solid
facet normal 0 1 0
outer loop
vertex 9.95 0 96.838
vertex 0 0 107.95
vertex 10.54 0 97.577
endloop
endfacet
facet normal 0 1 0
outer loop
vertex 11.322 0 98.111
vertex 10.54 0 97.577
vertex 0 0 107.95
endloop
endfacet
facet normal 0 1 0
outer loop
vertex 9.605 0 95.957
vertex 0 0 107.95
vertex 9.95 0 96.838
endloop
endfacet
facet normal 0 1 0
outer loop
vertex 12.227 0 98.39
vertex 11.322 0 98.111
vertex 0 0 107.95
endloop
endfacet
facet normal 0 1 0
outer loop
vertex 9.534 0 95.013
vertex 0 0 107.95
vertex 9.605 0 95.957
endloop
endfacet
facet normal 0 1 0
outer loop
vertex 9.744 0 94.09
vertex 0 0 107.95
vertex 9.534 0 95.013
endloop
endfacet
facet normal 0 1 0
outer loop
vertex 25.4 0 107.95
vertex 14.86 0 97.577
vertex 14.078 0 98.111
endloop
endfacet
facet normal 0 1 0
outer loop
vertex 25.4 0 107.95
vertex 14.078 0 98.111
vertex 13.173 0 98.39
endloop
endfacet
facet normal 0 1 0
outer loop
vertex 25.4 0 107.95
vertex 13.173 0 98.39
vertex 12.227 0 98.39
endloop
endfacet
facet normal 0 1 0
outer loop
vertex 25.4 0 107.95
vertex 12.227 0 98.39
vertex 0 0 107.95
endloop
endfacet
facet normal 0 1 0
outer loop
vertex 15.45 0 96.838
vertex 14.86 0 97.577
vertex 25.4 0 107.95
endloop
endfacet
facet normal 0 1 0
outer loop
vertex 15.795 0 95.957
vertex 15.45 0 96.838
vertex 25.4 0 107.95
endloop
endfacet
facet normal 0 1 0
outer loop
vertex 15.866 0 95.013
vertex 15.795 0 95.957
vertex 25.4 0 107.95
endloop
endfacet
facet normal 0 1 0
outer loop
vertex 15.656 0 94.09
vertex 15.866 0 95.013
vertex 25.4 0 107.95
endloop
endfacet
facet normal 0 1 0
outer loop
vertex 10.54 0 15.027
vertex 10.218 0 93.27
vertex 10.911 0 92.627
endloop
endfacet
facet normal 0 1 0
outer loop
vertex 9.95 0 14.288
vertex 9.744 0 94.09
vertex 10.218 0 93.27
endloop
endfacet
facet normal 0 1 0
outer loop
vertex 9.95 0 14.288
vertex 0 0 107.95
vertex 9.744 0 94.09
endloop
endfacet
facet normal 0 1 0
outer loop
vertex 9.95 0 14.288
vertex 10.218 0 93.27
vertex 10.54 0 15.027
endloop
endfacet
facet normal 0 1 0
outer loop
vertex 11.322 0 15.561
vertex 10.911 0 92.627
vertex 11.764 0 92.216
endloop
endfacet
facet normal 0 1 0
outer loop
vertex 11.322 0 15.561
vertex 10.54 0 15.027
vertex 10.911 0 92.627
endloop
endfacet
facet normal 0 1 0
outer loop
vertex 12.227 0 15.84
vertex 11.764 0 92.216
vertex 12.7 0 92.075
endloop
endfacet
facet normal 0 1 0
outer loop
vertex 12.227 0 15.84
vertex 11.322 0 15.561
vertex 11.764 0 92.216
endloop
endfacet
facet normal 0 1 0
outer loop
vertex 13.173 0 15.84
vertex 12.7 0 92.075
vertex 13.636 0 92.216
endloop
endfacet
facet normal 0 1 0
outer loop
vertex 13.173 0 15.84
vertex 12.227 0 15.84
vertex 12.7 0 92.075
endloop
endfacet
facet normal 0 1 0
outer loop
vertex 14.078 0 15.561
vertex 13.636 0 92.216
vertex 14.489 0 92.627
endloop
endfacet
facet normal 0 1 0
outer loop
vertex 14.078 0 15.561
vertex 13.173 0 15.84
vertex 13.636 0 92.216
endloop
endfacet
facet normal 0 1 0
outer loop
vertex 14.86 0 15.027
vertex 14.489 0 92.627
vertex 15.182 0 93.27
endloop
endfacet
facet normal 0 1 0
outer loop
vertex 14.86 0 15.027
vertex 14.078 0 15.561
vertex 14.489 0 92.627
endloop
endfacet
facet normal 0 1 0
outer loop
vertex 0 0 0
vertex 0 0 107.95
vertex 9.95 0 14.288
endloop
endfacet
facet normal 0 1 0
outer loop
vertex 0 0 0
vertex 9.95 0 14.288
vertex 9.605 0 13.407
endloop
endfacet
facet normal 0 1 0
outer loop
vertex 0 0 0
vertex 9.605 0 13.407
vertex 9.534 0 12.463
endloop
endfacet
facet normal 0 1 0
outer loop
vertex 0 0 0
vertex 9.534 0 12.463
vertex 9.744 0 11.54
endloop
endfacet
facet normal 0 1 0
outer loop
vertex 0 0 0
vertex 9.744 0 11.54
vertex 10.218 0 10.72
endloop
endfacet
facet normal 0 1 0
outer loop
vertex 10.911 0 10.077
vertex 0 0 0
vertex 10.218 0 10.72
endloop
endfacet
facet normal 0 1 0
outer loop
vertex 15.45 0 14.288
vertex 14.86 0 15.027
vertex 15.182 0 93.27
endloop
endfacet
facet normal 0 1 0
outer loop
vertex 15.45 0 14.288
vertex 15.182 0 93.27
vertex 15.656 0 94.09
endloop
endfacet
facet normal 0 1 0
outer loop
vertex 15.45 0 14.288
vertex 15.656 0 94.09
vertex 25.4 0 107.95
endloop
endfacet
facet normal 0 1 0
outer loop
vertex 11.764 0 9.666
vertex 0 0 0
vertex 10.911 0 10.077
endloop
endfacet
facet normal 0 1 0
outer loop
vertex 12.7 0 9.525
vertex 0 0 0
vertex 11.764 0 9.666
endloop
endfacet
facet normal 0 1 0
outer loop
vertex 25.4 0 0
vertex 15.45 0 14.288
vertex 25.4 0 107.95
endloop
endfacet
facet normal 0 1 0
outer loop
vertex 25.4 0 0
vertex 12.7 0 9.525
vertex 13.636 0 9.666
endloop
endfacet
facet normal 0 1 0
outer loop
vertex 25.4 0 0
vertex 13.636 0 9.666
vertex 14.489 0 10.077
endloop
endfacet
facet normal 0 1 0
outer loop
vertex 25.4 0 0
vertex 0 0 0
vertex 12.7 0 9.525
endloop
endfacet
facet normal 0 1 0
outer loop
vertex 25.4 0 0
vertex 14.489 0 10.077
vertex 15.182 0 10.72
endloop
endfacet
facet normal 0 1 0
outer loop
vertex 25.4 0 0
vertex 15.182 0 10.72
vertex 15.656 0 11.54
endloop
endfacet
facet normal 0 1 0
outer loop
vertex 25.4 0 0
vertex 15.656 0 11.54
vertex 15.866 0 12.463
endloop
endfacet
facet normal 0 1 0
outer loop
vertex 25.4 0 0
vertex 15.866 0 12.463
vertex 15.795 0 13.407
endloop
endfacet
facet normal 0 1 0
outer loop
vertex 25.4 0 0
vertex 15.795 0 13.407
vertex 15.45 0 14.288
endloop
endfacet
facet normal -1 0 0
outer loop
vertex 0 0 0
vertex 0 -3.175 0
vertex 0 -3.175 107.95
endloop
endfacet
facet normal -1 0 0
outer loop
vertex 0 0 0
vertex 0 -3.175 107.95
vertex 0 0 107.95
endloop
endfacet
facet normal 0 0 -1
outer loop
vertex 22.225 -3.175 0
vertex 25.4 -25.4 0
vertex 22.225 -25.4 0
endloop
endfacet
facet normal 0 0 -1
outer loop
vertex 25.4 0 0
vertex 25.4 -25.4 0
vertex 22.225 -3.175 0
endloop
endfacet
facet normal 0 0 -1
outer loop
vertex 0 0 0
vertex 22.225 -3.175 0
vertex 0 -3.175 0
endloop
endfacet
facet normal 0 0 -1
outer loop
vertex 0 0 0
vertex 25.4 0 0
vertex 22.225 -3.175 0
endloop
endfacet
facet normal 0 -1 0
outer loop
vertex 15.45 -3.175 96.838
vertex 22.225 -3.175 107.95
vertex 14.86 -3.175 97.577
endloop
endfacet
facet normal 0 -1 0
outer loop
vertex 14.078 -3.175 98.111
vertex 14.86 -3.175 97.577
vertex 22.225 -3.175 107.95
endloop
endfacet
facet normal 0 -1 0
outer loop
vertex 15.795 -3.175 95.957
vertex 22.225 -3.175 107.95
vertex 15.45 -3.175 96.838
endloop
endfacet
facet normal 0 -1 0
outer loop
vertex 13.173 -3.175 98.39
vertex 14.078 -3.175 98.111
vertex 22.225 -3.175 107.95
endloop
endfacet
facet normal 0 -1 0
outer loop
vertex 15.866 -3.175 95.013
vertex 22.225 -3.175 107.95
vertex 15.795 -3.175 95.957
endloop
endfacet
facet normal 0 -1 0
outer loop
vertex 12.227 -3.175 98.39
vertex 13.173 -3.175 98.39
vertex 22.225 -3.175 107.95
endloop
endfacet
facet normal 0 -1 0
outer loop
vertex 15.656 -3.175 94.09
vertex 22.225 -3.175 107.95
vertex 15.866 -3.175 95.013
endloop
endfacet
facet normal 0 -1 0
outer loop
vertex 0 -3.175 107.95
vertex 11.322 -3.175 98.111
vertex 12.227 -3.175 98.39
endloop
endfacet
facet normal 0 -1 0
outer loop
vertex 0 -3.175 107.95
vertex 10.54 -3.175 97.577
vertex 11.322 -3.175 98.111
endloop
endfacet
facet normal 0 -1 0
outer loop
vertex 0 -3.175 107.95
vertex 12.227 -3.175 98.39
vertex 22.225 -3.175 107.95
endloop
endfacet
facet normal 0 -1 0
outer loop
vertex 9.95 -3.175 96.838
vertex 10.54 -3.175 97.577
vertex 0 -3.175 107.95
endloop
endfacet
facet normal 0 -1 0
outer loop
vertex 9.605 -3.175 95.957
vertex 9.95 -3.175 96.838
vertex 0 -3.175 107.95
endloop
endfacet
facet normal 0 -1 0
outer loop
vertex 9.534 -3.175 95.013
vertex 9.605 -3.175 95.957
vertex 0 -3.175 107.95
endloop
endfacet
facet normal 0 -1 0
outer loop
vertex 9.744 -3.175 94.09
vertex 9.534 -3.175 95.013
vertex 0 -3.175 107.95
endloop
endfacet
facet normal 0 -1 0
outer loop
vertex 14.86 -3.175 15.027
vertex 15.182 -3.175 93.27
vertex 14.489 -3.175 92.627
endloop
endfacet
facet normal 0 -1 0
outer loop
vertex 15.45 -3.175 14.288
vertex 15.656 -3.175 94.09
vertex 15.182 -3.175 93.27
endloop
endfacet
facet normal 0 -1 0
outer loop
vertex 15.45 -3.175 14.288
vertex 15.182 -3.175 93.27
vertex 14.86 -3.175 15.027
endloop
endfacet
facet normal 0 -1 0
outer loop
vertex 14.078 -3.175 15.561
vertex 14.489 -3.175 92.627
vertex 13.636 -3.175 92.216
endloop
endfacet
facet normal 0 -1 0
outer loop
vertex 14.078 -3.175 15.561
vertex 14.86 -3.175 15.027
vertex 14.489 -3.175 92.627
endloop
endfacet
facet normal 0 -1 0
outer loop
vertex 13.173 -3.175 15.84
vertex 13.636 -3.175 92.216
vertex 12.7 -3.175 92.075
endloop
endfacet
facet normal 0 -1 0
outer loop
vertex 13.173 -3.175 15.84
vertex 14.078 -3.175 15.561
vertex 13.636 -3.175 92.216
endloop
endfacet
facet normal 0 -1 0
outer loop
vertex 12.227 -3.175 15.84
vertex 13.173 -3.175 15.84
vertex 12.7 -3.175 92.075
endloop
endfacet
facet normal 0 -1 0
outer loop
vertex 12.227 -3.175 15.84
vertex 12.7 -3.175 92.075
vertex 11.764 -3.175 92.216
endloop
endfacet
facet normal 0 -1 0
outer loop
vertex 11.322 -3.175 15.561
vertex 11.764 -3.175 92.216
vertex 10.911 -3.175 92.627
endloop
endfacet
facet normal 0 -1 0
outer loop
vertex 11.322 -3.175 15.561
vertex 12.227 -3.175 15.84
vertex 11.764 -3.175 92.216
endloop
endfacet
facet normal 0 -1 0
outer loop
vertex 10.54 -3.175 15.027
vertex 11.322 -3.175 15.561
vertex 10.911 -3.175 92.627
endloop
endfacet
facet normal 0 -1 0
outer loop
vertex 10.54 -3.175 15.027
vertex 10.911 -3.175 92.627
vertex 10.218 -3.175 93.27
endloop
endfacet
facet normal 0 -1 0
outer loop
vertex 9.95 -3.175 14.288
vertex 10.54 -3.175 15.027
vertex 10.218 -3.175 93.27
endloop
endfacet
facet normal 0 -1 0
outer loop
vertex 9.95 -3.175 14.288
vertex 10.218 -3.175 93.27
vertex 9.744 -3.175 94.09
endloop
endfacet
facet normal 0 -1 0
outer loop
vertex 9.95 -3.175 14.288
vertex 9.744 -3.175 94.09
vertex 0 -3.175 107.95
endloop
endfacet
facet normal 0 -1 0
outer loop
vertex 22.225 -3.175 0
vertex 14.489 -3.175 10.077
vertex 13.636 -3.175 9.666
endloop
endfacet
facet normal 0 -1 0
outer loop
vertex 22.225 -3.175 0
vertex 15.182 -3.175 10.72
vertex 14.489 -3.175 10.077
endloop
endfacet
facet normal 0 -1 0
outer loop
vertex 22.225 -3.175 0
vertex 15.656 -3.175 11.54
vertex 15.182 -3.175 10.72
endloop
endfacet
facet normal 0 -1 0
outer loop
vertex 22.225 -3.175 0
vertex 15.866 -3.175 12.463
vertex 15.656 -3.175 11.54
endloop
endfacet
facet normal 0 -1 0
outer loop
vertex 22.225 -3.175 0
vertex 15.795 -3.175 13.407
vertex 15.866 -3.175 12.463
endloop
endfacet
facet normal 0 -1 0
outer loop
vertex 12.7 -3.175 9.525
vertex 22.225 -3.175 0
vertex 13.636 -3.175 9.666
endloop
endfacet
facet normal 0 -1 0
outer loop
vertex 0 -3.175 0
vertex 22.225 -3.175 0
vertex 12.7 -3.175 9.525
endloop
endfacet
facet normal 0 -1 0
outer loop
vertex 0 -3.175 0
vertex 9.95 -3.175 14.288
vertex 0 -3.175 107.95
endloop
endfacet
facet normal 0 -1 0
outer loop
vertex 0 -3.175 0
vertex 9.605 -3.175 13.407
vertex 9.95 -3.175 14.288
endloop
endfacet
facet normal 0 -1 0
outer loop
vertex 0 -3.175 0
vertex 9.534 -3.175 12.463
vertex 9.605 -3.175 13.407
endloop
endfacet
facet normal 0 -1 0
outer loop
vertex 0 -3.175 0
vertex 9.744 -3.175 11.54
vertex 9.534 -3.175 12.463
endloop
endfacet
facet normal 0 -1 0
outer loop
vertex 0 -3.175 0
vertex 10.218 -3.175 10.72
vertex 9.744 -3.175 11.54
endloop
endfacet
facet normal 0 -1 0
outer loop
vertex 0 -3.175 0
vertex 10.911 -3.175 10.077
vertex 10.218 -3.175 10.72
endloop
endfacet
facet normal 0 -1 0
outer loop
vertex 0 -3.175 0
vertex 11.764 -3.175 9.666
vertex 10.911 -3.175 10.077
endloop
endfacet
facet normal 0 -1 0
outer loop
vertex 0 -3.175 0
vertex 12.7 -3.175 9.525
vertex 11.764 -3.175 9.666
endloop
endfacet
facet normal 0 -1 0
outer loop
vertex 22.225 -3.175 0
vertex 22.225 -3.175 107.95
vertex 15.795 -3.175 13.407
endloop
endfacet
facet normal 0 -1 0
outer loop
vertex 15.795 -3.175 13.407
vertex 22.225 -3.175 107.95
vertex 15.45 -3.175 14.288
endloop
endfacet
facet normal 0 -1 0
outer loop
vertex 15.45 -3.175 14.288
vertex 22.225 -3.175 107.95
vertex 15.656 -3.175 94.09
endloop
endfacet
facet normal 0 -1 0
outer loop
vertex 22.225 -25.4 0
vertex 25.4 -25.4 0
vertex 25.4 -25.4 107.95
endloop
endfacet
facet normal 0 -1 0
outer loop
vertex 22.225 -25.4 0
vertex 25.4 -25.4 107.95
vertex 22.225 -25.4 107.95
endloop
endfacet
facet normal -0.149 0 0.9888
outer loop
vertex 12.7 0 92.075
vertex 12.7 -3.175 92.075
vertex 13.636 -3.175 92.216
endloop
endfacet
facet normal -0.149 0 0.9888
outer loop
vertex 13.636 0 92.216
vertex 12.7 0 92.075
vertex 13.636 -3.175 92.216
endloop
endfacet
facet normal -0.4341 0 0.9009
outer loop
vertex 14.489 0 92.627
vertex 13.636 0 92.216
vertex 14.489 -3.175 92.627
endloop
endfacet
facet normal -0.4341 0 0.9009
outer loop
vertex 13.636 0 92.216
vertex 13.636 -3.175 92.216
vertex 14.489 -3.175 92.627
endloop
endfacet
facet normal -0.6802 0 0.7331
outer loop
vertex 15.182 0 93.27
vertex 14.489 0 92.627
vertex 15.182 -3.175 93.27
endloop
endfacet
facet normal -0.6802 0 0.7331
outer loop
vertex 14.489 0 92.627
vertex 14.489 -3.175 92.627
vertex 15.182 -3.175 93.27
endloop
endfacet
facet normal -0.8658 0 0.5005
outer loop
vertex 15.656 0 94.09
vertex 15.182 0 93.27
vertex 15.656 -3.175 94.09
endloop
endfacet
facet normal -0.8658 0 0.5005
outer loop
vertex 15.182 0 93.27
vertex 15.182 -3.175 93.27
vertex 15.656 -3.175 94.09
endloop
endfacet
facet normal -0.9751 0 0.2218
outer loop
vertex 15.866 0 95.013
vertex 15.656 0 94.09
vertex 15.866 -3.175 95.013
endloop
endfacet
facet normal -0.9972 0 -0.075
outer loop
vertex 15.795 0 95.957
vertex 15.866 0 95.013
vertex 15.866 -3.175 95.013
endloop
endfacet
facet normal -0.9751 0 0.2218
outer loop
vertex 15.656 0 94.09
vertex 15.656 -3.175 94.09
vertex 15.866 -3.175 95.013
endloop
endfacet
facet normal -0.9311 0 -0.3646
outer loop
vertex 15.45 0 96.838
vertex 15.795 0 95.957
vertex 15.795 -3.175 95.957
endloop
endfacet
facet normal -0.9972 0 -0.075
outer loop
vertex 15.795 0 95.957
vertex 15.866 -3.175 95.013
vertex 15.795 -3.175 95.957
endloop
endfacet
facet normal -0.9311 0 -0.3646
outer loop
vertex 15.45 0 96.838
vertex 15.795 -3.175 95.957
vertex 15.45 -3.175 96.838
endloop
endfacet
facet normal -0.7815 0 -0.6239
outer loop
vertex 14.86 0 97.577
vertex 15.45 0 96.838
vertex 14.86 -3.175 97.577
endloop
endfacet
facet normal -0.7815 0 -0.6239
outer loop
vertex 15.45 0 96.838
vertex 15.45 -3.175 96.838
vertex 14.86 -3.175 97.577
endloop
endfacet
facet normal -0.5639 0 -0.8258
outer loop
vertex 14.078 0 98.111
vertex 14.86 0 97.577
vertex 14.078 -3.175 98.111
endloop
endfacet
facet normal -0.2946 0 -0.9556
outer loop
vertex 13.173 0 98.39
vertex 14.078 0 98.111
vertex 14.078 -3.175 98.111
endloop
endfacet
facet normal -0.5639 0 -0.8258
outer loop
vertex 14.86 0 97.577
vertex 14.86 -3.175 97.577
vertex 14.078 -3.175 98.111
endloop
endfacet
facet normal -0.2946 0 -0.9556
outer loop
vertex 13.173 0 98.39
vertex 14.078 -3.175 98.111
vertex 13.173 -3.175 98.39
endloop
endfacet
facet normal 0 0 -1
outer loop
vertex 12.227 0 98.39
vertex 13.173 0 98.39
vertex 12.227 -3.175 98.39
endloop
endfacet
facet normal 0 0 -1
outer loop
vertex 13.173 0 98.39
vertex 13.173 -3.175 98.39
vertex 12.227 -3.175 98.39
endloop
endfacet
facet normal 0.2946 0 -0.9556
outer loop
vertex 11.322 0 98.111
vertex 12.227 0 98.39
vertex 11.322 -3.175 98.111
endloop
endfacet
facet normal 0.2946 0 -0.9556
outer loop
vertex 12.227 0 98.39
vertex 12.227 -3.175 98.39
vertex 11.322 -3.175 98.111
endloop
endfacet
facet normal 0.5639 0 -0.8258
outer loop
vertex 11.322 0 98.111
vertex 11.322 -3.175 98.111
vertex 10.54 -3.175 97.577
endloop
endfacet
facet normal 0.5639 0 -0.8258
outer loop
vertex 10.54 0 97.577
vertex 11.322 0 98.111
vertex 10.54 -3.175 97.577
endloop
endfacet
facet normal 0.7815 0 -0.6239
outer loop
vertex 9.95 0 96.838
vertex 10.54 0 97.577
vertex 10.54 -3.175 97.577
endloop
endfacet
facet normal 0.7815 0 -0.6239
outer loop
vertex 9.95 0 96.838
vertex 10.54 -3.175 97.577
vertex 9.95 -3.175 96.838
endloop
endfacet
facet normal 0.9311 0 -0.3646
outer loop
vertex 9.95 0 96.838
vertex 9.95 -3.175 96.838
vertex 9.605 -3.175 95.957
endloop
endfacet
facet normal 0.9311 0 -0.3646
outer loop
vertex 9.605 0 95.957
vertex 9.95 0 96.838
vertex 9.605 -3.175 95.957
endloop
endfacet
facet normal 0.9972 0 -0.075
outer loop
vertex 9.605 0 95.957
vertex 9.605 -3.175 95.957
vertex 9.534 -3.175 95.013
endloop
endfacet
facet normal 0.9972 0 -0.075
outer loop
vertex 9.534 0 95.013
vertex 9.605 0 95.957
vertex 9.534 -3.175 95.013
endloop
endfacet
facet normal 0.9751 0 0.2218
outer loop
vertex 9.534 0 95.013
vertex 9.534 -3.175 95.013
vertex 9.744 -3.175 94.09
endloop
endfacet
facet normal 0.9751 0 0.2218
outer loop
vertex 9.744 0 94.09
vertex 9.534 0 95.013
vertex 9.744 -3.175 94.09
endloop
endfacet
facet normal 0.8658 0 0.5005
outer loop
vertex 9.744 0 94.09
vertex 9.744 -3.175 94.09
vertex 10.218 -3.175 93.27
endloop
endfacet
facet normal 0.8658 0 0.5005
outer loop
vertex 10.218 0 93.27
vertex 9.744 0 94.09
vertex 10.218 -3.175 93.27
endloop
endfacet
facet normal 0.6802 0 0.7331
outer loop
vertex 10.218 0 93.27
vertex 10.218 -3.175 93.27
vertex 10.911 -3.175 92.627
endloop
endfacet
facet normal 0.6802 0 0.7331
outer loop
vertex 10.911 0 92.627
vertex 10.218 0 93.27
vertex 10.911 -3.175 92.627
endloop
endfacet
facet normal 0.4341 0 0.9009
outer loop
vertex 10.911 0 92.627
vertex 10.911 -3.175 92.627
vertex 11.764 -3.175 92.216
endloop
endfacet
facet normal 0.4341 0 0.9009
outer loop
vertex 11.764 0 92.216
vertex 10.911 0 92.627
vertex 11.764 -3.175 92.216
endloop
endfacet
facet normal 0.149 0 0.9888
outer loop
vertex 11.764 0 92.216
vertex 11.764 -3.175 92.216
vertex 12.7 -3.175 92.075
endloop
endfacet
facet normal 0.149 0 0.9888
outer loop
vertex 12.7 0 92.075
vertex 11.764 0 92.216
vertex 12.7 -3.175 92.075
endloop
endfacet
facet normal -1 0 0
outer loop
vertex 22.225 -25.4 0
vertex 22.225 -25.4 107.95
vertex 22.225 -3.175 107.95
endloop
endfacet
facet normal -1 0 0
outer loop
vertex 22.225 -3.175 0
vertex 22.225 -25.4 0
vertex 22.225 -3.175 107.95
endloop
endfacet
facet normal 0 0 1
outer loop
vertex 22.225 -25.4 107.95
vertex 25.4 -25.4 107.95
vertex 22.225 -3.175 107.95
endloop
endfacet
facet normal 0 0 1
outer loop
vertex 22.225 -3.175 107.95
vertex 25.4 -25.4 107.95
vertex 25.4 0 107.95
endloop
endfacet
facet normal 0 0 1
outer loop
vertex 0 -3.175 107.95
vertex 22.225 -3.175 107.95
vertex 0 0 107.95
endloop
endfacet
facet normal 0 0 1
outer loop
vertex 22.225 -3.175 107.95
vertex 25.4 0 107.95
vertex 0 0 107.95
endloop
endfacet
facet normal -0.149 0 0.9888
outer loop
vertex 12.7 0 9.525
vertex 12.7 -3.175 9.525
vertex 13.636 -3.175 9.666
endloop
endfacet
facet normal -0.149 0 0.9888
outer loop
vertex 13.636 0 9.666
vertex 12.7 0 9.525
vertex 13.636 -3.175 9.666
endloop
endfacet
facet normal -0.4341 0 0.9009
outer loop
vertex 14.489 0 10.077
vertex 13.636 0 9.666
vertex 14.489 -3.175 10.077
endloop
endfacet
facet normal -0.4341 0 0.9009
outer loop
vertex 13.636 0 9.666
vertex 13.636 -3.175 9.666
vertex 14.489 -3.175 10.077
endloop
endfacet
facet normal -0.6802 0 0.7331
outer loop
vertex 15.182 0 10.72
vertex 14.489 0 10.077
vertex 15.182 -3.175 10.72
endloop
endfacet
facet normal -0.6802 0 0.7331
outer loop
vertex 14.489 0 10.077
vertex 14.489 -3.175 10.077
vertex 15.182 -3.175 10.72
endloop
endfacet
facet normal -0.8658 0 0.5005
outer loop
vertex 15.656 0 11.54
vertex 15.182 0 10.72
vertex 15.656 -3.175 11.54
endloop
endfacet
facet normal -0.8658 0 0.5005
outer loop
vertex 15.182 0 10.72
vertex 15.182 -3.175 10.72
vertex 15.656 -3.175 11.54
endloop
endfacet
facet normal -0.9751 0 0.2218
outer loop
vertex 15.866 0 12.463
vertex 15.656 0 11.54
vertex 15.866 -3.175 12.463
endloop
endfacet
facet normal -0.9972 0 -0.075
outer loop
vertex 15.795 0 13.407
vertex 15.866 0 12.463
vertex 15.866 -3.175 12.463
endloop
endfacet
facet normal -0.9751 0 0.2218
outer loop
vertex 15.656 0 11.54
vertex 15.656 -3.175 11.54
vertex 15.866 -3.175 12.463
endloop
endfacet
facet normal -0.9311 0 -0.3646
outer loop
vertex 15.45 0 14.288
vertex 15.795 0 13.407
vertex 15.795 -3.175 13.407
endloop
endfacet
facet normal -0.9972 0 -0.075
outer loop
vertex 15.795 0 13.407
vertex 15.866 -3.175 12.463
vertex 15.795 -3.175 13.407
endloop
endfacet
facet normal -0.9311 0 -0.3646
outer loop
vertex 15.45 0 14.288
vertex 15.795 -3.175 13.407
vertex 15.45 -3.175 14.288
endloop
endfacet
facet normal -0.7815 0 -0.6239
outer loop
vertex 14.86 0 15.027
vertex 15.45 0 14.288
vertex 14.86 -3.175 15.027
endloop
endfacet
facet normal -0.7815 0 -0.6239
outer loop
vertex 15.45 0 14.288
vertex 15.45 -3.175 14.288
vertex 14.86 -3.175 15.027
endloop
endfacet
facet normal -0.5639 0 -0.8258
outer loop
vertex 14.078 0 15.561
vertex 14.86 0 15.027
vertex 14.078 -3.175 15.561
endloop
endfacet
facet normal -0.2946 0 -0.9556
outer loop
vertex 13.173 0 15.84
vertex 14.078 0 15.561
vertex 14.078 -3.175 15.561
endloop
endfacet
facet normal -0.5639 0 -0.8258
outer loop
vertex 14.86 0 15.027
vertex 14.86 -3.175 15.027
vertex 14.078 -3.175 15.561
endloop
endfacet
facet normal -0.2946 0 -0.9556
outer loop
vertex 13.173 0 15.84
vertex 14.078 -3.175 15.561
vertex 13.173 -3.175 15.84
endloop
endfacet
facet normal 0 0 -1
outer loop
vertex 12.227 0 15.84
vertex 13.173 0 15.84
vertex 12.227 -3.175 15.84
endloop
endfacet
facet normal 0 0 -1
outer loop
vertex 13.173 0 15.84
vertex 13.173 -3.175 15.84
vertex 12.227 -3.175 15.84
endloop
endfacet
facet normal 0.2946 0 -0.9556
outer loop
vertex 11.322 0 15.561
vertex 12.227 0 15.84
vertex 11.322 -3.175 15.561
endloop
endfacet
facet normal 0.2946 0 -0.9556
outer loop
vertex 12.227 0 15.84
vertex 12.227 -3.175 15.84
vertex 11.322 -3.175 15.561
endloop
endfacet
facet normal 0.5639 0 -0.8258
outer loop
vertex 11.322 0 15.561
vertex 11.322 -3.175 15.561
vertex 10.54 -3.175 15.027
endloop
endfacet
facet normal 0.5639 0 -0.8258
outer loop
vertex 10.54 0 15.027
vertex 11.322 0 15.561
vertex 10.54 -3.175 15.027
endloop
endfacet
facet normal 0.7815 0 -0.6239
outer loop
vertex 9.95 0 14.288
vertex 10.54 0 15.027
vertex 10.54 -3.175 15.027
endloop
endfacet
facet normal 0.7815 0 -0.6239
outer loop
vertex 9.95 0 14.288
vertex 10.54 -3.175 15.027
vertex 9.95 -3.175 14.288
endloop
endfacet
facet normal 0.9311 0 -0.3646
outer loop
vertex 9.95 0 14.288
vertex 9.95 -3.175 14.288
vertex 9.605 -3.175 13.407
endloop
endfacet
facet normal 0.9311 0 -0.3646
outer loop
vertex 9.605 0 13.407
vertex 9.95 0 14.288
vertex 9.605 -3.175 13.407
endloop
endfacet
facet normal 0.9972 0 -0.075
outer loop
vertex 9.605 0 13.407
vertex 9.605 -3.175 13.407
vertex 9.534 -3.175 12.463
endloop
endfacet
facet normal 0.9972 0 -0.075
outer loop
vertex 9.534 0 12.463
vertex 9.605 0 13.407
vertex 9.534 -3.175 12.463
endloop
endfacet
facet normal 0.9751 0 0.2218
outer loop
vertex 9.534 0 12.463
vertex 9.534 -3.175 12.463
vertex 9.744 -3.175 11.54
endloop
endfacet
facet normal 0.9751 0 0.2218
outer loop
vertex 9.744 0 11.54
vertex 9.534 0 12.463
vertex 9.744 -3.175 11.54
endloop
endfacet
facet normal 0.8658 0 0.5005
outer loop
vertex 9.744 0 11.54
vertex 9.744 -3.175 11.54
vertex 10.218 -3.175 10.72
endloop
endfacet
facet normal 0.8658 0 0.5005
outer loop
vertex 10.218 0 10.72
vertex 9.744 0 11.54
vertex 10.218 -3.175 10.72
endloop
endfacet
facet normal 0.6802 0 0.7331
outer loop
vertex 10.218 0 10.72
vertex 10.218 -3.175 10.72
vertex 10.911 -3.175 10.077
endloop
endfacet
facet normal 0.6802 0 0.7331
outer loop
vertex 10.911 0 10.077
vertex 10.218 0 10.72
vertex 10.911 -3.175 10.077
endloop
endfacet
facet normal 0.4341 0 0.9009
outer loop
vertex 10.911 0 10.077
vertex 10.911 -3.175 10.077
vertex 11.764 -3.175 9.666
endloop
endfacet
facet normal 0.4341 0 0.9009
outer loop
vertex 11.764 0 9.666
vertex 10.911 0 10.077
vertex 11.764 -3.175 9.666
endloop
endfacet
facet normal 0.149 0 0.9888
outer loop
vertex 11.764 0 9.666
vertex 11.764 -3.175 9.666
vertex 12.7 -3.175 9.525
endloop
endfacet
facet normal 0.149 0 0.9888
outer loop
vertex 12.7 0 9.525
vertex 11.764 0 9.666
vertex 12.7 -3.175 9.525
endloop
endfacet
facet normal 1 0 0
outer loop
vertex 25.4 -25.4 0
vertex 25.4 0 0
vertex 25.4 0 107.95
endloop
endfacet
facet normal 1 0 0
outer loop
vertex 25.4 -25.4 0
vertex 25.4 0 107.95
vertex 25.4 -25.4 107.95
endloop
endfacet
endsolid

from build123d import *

# Parameters (mm, degrees)
BOSS_EXTRUDE1_DEPTH = 107.95
CUT_EXTRUDE1_REACH  = 115.103
SKETCH2_R           = 3.175


with BuildPart() as part:
    # Sketch1 → Boss-Extrude1 (new body)
    with BuildSketch(Plane.XY):
        Polygon((0, 0), (25.4, 0), (25.4, -25.4), (22.225, -25.4), (22.225, -3.175), (0, -3.175), align=None)
    extrude(amount=BOSS_EXTRUDE1_DEPTH)

    # Sketch2 → Cut-Extrude1 (cut, up to next)
    with BuildSketch(Plane.XZ.offset(3.175), mode=Mode.PRIVATE) as cut_extrude1_sk1:
        with Locations(Location((12.7, 12.7, 0), (0, 0, 270))):
            Circle(SKETCH2_R)
    cut_extrude1_tool1 = extrude(cut_extrude1_sk1.sketch, amount=-CUT_EXTRUDE1_REACH, mode=Mode.PRIVATE) & part.part
    # Sketch2 → Cut-Extrude1 (cut, up to next)
    with BuildSketch(Plane.XZ.offset(3.175), mode=Mode.PRIVATE) as cut_extrude1_sk2:
        with Locations(Location((12.7, 95.25, 0), (0, 0, 270))):
            Circle(SKETCH2_R)
    cut_extrude1_tool2 = extrude(cut_extrude1_sk2.sketch, amount=-CUT_EXTRUDE1_REACH, mode=Mode.PRIVATE) & part.part
    add(cut_extrude1_tool1.solids().sort_by_distance((12.7, -3.175, 12.7))[0], mode=Mode.SUBTRACT)
    add(cut_extrude1_tool2.solids().sort_by_distance((12.7, -3.175, 95.25))[0], mode=Mode.SUBTRACT)


solid = part.part
